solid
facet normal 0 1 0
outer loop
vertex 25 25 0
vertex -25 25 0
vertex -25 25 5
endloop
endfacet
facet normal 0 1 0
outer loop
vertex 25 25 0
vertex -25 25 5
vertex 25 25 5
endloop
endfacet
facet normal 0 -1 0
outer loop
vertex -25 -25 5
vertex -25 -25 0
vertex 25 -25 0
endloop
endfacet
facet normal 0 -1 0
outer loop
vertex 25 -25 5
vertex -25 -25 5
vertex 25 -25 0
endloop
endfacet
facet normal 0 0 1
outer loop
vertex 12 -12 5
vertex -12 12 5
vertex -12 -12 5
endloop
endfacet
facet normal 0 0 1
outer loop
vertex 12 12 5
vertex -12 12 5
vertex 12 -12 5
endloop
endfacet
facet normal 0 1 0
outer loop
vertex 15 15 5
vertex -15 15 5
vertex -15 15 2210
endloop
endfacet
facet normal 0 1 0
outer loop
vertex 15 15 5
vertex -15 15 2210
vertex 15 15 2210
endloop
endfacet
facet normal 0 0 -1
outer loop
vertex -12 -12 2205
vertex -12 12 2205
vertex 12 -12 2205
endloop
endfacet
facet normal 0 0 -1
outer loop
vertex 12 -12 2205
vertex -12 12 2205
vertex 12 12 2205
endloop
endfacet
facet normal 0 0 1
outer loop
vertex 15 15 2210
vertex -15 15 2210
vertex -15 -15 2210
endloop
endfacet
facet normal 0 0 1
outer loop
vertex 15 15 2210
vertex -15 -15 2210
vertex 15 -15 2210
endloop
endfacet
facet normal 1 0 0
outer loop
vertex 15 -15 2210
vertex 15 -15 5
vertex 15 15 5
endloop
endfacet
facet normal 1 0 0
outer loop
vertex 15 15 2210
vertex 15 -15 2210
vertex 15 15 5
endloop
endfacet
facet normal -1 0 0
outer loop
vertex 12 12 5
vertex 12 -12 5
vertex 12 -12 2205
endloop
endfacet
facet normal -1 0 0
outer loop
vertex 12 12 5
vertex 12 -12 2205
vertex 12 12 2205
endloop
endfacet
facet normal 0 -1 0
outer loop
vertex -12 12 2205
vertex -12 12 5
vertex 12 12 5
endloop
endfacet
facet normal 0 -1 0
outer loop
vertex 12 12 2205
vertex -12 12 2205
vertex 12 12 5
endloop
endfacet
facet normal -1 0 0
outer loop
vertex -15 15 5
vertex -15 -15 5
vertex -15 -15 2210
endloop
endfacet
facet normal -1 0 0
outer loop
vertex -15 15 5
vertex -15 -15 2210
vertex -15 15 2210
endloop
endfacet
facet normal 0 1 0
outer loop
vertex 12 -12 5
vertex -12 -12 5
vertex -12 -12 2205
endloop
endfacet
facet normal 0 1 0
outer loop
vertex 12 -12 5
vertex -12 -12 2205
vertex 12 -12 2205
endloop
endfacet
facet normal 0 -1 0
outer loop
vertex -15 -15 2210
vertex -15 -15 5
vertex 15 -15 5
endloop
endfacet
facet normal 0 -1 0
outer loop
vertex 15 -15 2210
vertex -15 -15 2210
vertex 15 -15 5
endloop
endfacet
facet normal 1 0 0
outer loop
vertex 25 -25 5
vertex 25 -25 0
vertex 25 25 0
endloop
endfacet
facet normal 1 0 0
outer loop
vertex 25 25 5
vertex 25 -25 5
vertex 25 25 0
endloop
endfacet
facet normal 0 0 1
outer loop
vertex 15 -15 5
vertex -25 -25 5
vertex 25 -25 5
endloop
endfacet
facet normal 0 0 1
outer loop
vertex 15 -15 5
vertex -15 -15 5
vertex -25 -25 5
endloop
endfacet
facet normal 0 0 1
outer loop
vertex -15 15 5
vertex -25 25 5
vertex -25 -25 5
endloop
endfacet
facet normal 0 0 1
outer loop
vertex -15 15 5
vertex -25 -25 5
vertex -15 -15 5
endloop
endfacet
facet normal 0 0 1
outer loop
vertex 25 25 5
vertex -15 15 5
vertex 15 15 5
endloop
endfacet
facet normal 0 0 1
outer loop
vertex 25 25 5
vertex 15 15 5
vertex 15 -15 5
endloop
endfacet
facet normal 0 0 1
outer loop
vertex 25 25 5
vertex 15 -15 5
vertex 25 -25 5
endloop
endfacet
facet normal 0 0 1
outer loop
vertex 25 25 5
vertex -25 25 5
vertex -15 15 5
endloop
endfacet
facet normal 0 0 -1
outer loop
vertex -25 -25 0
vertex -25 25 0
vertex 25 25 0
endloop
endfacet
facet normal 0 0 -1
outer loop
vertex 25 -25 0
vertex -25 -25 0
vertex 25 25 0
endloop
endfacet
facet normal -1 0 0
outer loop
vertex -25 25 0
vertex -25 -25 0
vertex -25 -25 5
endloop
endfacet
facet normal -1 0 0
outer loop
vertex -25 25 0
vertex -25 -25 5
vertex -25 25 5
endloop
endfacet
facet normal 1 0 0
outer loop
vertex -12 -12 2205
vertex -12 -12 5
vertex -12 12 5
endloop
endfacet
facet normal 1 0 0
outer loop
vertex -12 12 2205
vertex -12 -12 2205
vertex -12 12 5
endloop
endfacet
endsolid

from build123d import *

# Parameters (mm, degrees)
SCHIZZO1_W                   = 50
SCHIZZO1_H                   = 50
ESTRUSIONE_ESTRUSIONE1_DEPTH = 5
SCHIZZO2_W                   = 30
SCHIZZO2_H                   = 30
SCHIZZO2_W_2                 = 24
SCHIZZO2_H_2                 = 24
ESTRUSIONE_ESTRUSIONE2_DEPTH = 2205
SCHIZZO3_W                   = 24
SCHIZZO3_H                   = 24
ESTRUSIONE_ESTRUSIONE3_DEPTH = 5


with BuildPart() as part:
    # Schizzo1 → Estrusione-Estrusione1 (new body)
    with BuildSketch(Plane.XY):
        Rectangle(SCHIZZO1_W, SCHIZZO1_H)
    extrude(amount=ESTRUSIONE_ESTRUSIONE1_DEPTH)

    # Schizzo2 → Estrusione-Estrusione2 (add)
    with BuildSketch(Plane.XY.offset(5)):
        Rectangle(SCHIZZO2_W, SCHIZZO2_H)
        Rectangle(SCHIZZO2_W_2, SCHIZZO2_H_2, mode=Mode.SUBTRACT)
    extrude(amount=ESTRUSIONE_ESTRUSIONE2_DEPTH)

    # Schizzo3 → Estrusione-Estrusione3 (add)
    with BuildSketch(Plane.XY.offset(2210)):
        Rectangle(SCHIZZO3_W, SCHIZZO3_H)
    extrude(amount=-ESTRUSIONE_ESTRUSIONE3_DEPTH)


solid = part.part
